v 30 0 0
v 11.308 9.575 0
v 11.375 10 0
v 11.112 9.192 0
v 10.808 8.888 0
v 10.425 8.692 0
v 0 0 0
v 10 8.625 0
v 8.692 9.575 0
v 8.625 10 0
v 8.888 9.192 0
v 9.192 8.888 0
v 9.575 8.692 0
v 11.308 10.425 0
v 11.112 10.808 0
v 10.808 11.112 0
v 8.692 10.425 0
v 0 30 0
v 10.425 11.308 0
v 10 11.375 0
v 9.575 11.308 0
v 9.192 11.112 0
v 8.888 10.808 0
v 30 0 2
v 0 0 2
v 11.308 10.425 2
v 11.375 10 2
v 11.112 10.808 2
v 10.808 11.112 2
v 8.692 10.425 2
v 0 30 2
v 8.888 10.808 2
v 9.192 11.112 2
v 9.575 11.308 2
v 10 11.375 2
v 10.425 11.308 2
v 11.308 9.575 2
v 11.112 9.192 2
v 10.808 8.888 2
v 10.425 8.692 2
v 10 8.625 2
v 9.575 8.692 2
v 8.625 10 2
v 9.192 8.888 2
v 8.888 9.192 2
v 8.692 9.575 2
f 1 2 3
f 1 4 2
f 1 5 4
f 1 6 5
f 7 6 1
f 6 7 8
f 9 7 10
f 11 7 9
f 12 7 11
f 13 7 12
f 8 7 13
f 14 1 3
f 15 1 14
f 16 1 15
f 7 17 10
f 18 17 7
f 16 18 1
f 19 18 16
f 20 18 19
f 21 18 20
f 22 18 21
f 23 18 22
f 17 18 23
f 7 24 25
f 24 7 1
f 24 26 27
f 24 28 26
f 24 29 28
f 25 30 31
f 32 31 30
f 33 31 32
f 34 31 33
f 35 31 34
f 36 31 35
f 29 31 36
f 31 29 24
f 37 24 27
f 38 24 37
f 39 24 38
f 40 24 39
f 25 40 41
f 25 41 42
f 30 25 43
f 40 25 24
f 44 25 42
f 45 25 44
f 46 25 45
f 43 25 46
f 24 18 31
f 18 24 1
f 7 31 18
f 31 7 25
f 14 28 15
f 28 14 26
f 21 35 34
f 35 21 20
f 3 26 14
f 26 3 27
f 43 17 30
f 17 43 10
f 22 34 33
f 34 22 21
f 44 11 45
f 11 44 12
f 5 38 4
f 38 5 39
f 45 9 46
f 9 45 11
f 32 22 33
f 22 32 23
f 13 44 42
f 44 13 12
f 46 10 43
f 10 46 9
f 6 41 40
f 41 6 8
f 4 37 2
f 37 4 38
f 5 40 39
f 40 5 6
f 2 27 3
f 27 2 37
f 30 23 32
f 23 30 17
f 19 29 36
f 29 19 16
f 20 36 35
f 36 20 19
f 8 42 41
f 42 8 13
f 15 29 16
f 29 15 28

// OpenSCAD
// file: panel.scad
$fn = 20;
U = 3;
T = 16;

h = U * 44.5 - 5;
w = T * 5.08 - 2*.2;

m_x = 7.47;
//m_x = 0;
m_y = 3.1;
m_d = 3;

F = U * 44.5 + (122.5 - 3 * 44.5);

echo(w);

module hole() {
//    hull() {
    //circle(d=m_d);
    translate([5.08/2,0]) circle(d=m_d);
//    }
}

module holes() {
    translate([m_x, m_y]) hole();
    translate([m_x, m_y + F]) hole();
}

module panel() {
    difference() {
    square([w, h]);
        holes();
        if(T>6) {
            translate([(T-3) * 5.08 - 5.08, 0]) holes();
        }
        translate([(T-24) * 5.08, 0]) holes();
    }
}

//panel();

//#square([46,62]);
//#import("jr-module-bay-cover.stl");
// main file
b_w = 13;
b_h = 20;

include <panel.scad>

T=10;
U = 2;

difference() {
    linear_extrude(2)
    polygon(points=[[0, 0], [30, 0], [0, 30]]);
    difference() {
    
    linear_extrude(2)
    translate([10, 10])
    intersection() {
        circle(d=2.75);
    }

    }

}
